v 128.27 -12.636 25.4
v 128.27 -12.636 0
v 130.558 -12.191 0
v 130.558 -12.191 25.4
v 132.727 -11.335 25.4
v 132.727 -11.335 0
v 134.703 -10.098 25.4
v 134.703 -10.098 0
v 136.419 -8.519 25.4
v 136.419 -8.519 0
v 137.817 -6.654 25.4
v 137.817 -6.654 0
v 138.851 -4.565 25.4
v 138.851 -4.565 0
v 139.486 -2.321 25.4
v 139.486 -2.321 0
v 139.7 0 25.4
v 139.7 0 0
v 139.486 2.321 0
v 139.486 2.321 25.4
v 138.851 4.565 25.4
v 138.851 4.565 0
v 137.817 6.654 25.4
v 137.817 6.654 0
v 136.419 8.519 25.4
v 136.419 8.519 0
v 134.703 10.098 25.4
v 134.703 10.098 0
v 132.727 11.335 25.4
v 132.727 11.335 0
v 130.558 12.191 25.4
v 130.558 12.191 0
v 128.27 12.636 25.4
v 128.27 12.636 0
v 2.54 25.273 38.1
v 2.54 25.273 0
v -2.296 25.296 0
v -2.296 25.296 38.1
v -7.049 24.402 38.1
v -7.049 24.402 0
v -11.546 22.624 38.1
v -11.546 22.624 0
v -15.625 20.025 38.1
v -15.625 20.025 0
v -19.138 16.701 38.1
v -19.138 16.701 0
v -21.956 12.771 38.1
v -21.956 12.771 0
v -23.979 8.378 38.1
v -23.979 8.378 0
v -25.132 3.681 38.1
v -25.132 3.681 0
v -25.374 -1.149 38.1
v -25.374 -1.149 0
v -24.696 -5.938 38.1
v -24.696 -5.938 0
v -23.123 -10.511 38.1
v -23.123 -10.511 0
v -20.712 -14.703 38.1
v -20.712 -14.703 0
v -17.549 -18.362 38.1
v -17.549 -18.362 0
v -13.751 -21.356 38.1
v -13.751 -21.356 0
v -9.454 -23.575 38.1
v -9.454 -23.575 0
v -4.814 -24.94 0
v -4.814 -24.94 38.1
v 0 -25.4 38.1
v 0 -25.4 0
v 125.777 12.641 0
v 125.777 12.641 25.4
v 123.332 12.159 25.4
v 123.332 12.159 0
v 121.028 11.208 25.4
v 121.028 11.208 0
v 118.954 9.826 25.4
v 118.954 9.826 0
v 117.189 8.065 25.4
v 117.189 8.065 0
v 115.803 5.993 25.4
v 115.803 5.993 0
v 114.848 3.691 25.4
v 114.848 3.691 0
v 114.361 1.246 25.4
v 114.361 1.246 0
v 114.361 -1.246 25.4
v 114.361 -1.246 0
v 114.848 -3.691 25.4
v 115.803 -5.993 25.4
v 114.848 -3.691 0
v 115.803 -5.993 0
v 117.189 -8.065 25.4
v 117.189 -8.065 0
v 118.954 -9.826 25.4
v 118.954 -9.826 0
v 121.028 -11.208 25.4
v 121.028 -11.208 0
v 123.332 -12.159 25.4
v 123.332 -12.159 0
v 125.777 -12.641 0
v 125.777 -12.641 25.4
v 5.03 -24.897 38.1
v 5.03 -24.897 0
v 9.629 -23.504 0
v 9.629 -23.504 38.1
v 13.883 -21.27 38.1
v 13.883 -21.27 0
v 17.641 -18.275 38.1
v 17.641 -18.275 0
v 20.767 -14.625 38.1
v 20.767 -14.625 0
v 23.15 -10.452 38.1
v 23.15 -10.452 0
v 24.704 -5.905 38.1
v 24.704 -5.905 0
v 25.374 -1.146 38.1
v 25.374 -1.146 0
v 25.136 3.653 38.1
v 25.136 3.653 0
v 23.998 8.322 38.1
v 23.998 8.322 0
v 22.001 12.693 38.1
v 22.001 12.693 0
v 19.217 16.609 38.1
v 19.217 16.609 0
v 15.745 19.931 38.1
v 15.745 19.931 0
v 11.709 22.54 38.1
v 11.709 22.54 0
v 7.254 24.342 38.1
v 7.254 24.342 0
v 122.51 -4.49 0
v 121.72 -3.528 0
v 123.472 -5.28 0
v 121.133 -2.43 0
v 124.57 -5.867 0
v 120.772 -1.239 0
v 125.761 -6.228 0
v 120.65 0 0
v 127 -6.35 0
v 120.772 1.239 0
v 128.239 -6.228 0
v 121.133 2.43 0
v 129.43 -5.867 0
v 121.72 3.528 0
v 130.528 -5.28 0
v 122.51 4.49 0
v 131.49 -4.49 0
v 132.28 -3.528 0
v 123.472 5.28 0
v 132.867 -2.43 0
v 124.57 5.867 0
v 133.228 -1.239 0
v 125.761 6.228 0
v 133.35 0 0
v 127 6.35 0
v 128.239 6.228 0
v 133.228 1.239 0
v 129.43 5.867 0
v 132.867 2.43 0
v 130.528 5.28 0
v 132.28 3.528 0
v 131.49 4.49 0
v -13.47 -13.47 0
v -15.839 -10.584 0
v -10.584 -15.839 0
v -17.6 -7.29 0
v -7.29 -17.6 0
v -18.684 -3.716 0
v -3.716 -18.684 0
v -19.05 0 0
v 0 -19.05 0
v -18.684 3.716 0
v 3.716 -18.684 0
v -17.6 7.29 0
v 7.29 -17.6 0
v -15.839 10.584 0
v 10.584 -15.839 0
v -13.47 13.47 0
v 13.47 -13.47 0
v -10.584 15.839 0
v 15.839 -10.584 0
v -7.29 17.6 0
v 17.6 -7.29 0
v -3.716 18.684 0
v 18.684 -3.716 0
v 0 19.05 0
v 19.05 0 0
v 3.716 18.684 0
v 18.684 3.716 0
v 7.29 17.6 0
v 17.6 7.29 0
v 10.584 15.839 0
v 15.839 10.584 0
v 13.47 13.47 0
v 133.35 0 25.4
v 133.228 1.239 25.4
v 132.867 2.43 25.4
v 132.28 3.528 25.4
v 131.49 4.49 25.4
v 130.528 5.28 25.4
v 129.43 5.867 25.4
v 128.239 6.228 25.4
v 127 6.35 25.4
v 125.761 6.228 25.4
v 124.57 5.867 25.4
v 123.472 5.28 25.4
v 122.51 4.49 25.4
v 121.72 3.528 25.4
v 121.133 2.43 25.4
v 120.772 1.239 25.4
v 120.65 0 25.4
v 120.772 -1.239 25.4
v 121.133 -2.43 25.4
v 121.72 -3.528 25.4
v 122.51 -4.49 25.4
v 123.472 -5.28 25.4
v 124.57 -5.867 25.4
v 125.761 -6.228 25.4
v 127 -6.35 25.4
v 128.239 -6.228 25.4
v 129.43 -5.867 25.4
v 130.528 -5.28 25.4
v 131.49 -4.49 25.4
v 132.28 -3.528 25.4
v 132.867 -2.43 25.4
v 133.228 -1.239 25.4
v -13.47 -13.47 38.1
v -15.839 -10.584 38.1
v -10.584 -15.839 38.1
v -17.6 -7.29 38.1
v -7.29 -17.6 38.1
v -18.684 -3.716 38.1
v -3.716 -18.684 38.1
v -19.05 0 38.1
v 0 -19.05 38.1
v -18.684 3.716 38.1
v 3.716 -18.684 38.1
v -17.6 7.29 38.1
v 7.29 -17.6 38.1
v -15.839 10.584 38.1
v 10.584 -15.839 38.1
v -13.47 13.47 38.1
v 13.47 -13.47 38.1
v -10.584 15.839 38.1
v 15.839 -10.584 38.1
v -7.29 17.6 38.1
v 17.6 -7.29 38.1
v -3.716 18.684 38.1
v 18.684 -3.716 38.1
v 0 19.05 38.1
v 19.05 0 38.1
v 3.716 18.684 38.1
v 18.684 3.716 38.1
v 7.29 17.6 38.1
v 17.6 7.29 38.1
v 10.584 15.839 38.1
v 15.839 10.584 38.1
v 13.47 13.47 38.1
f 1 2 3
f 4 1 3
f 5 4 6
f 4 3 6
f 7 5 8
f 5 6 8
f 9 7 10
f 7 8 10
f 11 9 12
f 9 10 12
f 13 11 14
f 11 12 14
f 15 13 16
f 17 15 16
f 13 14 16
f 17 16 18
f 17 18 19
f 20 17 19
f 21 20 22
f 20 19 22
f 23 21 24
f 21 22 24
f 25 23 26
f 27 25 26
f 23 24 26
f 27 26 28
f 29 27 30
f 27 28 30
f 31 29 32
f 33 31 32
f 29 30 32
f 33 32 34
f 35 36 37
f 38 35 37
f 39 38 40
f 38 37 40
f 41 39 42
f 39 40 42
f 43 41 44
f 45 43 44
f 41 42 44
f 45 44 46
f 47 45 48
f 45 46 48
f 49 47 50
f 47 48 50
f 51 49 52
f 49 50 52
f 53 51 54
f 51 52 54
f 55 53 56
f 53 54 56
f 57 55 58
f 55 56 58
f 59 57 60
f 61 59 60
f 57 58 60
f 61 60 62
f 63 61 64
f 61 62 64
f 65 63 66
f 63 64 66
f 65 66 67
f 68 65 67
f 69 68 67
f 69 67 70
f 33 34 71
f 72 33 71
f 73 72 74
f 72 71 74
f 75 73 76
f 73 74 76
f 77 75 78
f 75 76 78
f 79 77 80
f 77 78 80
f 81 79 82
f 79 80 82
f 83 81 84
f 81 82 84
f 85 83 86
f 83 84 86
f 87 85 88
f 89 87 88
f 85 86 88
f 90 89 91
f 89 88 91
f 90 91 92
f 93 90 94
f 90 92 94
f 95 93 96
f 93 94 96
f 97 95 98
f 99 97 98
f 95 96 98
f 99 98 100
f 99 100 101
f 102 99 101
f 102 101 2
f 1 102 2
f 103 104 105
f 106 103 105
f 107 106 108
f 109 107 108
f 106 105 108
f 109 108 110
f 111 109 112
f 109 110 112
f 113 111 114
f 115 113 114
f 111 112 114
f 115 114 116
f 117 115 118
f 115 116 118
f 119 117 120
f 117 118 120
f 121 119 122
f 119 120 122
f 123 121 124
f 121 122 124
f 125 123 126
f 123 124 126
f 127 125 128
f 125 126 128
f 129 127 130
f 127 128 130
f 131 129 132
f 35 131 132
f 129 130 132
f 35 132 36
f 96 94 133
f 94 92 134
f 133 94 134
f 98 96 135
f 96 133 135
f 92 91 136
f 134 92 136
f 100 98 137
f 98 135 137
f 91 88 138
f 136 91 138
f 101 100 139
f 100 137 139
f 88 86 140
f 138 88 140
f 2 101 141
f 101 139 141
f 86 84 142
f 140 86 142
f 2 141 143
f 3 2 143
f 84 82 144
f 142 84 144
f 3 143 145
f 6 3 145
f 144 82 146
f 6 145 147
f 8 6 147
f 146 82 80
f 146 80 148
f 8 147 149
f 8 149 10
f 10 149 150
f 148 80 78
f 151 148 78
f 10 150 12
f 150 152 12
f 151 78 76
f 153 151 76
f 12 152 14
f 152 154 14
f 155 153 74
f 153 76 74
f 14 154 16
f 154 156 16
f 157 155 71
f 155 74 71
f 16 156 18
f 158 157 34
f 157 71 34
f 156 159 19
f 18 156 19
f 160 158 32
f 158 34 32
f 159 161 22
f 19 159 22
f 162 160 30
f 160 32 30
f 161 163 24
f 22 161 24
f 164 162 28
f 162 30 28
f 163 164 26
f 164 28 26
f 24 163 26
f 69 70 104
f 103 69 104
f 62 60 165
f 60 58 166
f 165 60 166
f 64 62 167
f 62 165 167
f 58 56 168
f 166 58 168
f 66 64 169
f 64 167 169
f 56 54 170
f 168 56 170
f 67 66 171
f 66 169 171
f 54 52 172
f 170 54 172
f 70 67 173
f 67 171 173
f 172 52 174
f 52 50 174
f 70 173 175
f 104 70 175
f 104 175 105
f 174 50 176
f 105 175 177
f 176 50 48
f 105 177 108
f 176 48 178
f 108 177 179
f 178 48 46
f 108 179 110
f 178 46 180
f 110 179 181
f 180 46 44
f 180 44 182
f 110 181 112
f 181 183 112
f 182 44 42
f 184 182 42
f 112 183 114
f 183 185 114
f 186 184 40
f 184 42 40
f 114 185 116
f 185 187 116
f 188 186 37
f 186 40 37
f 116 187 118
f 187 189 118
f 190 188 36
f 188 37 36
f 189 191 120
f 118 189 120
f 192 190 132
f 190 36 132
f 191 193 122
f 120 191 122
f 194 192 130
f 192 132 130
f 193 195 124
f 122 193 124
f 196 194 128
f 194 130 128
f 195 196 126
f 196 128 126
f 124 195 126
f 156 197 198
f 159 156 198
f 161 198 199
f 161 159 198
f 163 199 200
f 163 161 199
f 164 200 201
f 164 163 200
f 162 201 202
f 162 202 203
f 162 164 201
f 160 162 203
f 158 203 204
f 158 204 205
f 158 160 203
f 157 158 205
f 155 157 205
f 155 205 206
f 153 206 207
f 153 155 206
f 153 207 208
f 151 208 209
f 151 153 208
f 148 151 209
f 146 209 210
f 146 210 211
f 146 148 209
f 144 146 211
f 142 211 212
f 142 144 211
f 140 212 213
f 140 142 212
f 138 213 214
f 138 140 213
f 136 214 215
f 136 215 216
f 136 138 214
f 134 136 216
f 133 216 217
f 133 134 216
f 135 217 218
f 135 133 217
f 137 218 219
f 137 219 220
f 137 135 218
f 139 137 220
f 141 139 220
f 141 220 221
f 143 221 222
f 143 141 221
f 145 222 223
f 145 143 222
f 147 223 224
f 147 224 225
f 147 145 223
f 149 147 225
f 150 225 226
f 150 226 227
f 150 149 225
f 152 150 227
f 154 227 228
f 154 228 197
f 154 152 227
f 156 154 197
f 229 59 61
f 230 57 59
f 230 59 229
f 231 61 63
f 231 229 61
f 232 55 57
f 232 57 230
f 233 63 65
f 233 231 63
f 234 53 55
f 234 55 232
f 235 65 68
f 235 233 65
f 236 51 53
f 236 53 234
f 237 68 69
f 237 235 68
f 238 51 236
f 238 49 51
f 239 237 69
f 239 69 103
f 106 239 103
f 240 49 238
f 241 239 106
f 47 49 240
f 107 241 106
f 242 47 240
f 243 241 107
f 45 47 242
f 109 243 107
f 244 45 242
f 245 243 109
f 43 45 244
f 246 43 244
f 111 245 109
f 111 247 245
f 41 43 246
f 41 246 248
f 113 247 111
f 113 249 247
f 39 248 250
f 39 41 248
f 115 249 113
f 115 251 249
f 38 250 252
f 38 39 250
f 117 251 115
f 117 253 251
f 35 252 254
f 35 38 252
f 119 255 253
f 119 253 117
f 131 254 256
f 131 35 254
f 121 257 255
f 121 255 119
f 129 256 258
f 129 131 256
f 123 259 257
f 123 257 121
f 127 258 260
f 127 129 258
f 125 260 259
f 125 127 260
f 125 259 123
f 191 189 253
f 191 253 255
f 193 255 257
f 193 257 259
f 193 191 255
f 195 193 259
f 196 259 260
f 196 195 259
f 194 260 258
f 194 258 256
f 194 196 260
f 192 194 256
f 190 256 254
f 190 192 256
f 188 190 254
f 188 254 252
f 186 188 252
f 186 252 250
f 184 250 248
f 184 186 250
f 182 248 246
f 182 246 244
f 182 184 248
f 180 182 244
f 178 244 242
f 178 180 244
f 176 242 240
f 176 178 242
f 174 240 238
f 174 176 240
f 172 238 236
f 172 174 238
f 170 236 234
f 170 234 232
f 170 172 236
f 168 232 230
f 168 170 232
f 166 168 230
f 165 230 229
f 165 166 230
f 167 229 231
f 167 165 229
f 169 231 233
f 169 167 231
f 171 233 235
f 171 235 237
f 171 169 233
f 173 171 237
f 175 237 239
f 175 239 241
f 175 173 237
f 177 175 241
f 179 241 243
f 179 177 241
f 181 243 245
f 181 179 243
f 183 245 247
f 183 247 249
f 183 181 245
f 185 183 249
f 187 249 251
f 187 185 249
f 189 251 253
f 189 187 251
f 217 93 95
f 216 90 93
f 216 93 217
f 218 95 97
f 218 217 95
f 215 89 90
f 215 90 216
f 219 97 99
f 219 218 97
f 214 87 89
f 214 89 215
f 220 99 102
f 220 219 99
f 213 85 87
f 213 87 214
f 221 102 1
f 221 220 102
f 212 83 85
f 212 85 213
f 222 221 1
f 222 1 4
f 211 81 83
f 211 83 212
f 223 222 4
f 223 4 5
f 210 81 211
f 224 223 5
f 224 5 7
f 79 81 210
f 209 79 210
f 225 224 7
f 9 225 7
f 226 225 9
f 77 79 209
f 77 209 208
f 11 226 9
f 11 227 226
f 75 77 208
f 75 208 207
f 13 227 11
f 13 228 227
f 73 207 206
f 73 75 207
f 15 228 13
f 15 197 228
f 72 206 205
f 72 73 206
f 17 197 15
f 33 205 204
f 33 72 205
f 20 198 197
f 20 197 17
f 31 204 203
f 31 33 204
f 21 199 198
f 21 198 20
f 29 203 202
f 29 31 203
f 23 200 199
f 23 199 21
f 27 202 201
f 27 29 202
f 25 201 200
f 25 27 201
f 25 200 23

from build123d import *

# Parameters (mm, degrees)
F0_R     = 19.05
F1_DEPTH = 38.1
F0_R_2   = 6.35
F2_DEPTH = 25.4


with BuildPart() as f1:
    # F0 (on Top) → F1 (new body)
    with BuildSketch(Plane.XY):
        with BuildLine():
            Line((0, -25.4), (5.029703, -24.89703))
            ThreePointArc((5.029703, -24.89703), (25.368781, 1.258941), (2.54, 25.272681))
            ThreePointArc((2.54, 25.272681), (-25.36815, 1.271594), (0, -25.4))
        make_face()
        Circle(F0_R, mode=Mode.SUBTRACT)
    extrude(amount=F1_DEPTH)


with BuildPart() as f2:
    # F0 (on Top) → F2 (new body)
    with BuildSketch(Plane.XY):
        with BuildLine():
            ThreePointArc((139.7, 0), (136.418572, 8.519419), (128.27, 12.63634))
            ThreePointArc((128.27, 12.63634), (114.3, 0), (128.27, -12.63634))
            ThreePointArc((128.27, -12.63634), (136.418572, -8.519419), (139.7, 0))
        make_face()
        with Locations((127, 0)):
            Circle(F0_R_2, mode=Mode.SUBTRACT)
    extrude(amount=F2_DEPTH)


solid = Compound([f1.part, f2.part])
